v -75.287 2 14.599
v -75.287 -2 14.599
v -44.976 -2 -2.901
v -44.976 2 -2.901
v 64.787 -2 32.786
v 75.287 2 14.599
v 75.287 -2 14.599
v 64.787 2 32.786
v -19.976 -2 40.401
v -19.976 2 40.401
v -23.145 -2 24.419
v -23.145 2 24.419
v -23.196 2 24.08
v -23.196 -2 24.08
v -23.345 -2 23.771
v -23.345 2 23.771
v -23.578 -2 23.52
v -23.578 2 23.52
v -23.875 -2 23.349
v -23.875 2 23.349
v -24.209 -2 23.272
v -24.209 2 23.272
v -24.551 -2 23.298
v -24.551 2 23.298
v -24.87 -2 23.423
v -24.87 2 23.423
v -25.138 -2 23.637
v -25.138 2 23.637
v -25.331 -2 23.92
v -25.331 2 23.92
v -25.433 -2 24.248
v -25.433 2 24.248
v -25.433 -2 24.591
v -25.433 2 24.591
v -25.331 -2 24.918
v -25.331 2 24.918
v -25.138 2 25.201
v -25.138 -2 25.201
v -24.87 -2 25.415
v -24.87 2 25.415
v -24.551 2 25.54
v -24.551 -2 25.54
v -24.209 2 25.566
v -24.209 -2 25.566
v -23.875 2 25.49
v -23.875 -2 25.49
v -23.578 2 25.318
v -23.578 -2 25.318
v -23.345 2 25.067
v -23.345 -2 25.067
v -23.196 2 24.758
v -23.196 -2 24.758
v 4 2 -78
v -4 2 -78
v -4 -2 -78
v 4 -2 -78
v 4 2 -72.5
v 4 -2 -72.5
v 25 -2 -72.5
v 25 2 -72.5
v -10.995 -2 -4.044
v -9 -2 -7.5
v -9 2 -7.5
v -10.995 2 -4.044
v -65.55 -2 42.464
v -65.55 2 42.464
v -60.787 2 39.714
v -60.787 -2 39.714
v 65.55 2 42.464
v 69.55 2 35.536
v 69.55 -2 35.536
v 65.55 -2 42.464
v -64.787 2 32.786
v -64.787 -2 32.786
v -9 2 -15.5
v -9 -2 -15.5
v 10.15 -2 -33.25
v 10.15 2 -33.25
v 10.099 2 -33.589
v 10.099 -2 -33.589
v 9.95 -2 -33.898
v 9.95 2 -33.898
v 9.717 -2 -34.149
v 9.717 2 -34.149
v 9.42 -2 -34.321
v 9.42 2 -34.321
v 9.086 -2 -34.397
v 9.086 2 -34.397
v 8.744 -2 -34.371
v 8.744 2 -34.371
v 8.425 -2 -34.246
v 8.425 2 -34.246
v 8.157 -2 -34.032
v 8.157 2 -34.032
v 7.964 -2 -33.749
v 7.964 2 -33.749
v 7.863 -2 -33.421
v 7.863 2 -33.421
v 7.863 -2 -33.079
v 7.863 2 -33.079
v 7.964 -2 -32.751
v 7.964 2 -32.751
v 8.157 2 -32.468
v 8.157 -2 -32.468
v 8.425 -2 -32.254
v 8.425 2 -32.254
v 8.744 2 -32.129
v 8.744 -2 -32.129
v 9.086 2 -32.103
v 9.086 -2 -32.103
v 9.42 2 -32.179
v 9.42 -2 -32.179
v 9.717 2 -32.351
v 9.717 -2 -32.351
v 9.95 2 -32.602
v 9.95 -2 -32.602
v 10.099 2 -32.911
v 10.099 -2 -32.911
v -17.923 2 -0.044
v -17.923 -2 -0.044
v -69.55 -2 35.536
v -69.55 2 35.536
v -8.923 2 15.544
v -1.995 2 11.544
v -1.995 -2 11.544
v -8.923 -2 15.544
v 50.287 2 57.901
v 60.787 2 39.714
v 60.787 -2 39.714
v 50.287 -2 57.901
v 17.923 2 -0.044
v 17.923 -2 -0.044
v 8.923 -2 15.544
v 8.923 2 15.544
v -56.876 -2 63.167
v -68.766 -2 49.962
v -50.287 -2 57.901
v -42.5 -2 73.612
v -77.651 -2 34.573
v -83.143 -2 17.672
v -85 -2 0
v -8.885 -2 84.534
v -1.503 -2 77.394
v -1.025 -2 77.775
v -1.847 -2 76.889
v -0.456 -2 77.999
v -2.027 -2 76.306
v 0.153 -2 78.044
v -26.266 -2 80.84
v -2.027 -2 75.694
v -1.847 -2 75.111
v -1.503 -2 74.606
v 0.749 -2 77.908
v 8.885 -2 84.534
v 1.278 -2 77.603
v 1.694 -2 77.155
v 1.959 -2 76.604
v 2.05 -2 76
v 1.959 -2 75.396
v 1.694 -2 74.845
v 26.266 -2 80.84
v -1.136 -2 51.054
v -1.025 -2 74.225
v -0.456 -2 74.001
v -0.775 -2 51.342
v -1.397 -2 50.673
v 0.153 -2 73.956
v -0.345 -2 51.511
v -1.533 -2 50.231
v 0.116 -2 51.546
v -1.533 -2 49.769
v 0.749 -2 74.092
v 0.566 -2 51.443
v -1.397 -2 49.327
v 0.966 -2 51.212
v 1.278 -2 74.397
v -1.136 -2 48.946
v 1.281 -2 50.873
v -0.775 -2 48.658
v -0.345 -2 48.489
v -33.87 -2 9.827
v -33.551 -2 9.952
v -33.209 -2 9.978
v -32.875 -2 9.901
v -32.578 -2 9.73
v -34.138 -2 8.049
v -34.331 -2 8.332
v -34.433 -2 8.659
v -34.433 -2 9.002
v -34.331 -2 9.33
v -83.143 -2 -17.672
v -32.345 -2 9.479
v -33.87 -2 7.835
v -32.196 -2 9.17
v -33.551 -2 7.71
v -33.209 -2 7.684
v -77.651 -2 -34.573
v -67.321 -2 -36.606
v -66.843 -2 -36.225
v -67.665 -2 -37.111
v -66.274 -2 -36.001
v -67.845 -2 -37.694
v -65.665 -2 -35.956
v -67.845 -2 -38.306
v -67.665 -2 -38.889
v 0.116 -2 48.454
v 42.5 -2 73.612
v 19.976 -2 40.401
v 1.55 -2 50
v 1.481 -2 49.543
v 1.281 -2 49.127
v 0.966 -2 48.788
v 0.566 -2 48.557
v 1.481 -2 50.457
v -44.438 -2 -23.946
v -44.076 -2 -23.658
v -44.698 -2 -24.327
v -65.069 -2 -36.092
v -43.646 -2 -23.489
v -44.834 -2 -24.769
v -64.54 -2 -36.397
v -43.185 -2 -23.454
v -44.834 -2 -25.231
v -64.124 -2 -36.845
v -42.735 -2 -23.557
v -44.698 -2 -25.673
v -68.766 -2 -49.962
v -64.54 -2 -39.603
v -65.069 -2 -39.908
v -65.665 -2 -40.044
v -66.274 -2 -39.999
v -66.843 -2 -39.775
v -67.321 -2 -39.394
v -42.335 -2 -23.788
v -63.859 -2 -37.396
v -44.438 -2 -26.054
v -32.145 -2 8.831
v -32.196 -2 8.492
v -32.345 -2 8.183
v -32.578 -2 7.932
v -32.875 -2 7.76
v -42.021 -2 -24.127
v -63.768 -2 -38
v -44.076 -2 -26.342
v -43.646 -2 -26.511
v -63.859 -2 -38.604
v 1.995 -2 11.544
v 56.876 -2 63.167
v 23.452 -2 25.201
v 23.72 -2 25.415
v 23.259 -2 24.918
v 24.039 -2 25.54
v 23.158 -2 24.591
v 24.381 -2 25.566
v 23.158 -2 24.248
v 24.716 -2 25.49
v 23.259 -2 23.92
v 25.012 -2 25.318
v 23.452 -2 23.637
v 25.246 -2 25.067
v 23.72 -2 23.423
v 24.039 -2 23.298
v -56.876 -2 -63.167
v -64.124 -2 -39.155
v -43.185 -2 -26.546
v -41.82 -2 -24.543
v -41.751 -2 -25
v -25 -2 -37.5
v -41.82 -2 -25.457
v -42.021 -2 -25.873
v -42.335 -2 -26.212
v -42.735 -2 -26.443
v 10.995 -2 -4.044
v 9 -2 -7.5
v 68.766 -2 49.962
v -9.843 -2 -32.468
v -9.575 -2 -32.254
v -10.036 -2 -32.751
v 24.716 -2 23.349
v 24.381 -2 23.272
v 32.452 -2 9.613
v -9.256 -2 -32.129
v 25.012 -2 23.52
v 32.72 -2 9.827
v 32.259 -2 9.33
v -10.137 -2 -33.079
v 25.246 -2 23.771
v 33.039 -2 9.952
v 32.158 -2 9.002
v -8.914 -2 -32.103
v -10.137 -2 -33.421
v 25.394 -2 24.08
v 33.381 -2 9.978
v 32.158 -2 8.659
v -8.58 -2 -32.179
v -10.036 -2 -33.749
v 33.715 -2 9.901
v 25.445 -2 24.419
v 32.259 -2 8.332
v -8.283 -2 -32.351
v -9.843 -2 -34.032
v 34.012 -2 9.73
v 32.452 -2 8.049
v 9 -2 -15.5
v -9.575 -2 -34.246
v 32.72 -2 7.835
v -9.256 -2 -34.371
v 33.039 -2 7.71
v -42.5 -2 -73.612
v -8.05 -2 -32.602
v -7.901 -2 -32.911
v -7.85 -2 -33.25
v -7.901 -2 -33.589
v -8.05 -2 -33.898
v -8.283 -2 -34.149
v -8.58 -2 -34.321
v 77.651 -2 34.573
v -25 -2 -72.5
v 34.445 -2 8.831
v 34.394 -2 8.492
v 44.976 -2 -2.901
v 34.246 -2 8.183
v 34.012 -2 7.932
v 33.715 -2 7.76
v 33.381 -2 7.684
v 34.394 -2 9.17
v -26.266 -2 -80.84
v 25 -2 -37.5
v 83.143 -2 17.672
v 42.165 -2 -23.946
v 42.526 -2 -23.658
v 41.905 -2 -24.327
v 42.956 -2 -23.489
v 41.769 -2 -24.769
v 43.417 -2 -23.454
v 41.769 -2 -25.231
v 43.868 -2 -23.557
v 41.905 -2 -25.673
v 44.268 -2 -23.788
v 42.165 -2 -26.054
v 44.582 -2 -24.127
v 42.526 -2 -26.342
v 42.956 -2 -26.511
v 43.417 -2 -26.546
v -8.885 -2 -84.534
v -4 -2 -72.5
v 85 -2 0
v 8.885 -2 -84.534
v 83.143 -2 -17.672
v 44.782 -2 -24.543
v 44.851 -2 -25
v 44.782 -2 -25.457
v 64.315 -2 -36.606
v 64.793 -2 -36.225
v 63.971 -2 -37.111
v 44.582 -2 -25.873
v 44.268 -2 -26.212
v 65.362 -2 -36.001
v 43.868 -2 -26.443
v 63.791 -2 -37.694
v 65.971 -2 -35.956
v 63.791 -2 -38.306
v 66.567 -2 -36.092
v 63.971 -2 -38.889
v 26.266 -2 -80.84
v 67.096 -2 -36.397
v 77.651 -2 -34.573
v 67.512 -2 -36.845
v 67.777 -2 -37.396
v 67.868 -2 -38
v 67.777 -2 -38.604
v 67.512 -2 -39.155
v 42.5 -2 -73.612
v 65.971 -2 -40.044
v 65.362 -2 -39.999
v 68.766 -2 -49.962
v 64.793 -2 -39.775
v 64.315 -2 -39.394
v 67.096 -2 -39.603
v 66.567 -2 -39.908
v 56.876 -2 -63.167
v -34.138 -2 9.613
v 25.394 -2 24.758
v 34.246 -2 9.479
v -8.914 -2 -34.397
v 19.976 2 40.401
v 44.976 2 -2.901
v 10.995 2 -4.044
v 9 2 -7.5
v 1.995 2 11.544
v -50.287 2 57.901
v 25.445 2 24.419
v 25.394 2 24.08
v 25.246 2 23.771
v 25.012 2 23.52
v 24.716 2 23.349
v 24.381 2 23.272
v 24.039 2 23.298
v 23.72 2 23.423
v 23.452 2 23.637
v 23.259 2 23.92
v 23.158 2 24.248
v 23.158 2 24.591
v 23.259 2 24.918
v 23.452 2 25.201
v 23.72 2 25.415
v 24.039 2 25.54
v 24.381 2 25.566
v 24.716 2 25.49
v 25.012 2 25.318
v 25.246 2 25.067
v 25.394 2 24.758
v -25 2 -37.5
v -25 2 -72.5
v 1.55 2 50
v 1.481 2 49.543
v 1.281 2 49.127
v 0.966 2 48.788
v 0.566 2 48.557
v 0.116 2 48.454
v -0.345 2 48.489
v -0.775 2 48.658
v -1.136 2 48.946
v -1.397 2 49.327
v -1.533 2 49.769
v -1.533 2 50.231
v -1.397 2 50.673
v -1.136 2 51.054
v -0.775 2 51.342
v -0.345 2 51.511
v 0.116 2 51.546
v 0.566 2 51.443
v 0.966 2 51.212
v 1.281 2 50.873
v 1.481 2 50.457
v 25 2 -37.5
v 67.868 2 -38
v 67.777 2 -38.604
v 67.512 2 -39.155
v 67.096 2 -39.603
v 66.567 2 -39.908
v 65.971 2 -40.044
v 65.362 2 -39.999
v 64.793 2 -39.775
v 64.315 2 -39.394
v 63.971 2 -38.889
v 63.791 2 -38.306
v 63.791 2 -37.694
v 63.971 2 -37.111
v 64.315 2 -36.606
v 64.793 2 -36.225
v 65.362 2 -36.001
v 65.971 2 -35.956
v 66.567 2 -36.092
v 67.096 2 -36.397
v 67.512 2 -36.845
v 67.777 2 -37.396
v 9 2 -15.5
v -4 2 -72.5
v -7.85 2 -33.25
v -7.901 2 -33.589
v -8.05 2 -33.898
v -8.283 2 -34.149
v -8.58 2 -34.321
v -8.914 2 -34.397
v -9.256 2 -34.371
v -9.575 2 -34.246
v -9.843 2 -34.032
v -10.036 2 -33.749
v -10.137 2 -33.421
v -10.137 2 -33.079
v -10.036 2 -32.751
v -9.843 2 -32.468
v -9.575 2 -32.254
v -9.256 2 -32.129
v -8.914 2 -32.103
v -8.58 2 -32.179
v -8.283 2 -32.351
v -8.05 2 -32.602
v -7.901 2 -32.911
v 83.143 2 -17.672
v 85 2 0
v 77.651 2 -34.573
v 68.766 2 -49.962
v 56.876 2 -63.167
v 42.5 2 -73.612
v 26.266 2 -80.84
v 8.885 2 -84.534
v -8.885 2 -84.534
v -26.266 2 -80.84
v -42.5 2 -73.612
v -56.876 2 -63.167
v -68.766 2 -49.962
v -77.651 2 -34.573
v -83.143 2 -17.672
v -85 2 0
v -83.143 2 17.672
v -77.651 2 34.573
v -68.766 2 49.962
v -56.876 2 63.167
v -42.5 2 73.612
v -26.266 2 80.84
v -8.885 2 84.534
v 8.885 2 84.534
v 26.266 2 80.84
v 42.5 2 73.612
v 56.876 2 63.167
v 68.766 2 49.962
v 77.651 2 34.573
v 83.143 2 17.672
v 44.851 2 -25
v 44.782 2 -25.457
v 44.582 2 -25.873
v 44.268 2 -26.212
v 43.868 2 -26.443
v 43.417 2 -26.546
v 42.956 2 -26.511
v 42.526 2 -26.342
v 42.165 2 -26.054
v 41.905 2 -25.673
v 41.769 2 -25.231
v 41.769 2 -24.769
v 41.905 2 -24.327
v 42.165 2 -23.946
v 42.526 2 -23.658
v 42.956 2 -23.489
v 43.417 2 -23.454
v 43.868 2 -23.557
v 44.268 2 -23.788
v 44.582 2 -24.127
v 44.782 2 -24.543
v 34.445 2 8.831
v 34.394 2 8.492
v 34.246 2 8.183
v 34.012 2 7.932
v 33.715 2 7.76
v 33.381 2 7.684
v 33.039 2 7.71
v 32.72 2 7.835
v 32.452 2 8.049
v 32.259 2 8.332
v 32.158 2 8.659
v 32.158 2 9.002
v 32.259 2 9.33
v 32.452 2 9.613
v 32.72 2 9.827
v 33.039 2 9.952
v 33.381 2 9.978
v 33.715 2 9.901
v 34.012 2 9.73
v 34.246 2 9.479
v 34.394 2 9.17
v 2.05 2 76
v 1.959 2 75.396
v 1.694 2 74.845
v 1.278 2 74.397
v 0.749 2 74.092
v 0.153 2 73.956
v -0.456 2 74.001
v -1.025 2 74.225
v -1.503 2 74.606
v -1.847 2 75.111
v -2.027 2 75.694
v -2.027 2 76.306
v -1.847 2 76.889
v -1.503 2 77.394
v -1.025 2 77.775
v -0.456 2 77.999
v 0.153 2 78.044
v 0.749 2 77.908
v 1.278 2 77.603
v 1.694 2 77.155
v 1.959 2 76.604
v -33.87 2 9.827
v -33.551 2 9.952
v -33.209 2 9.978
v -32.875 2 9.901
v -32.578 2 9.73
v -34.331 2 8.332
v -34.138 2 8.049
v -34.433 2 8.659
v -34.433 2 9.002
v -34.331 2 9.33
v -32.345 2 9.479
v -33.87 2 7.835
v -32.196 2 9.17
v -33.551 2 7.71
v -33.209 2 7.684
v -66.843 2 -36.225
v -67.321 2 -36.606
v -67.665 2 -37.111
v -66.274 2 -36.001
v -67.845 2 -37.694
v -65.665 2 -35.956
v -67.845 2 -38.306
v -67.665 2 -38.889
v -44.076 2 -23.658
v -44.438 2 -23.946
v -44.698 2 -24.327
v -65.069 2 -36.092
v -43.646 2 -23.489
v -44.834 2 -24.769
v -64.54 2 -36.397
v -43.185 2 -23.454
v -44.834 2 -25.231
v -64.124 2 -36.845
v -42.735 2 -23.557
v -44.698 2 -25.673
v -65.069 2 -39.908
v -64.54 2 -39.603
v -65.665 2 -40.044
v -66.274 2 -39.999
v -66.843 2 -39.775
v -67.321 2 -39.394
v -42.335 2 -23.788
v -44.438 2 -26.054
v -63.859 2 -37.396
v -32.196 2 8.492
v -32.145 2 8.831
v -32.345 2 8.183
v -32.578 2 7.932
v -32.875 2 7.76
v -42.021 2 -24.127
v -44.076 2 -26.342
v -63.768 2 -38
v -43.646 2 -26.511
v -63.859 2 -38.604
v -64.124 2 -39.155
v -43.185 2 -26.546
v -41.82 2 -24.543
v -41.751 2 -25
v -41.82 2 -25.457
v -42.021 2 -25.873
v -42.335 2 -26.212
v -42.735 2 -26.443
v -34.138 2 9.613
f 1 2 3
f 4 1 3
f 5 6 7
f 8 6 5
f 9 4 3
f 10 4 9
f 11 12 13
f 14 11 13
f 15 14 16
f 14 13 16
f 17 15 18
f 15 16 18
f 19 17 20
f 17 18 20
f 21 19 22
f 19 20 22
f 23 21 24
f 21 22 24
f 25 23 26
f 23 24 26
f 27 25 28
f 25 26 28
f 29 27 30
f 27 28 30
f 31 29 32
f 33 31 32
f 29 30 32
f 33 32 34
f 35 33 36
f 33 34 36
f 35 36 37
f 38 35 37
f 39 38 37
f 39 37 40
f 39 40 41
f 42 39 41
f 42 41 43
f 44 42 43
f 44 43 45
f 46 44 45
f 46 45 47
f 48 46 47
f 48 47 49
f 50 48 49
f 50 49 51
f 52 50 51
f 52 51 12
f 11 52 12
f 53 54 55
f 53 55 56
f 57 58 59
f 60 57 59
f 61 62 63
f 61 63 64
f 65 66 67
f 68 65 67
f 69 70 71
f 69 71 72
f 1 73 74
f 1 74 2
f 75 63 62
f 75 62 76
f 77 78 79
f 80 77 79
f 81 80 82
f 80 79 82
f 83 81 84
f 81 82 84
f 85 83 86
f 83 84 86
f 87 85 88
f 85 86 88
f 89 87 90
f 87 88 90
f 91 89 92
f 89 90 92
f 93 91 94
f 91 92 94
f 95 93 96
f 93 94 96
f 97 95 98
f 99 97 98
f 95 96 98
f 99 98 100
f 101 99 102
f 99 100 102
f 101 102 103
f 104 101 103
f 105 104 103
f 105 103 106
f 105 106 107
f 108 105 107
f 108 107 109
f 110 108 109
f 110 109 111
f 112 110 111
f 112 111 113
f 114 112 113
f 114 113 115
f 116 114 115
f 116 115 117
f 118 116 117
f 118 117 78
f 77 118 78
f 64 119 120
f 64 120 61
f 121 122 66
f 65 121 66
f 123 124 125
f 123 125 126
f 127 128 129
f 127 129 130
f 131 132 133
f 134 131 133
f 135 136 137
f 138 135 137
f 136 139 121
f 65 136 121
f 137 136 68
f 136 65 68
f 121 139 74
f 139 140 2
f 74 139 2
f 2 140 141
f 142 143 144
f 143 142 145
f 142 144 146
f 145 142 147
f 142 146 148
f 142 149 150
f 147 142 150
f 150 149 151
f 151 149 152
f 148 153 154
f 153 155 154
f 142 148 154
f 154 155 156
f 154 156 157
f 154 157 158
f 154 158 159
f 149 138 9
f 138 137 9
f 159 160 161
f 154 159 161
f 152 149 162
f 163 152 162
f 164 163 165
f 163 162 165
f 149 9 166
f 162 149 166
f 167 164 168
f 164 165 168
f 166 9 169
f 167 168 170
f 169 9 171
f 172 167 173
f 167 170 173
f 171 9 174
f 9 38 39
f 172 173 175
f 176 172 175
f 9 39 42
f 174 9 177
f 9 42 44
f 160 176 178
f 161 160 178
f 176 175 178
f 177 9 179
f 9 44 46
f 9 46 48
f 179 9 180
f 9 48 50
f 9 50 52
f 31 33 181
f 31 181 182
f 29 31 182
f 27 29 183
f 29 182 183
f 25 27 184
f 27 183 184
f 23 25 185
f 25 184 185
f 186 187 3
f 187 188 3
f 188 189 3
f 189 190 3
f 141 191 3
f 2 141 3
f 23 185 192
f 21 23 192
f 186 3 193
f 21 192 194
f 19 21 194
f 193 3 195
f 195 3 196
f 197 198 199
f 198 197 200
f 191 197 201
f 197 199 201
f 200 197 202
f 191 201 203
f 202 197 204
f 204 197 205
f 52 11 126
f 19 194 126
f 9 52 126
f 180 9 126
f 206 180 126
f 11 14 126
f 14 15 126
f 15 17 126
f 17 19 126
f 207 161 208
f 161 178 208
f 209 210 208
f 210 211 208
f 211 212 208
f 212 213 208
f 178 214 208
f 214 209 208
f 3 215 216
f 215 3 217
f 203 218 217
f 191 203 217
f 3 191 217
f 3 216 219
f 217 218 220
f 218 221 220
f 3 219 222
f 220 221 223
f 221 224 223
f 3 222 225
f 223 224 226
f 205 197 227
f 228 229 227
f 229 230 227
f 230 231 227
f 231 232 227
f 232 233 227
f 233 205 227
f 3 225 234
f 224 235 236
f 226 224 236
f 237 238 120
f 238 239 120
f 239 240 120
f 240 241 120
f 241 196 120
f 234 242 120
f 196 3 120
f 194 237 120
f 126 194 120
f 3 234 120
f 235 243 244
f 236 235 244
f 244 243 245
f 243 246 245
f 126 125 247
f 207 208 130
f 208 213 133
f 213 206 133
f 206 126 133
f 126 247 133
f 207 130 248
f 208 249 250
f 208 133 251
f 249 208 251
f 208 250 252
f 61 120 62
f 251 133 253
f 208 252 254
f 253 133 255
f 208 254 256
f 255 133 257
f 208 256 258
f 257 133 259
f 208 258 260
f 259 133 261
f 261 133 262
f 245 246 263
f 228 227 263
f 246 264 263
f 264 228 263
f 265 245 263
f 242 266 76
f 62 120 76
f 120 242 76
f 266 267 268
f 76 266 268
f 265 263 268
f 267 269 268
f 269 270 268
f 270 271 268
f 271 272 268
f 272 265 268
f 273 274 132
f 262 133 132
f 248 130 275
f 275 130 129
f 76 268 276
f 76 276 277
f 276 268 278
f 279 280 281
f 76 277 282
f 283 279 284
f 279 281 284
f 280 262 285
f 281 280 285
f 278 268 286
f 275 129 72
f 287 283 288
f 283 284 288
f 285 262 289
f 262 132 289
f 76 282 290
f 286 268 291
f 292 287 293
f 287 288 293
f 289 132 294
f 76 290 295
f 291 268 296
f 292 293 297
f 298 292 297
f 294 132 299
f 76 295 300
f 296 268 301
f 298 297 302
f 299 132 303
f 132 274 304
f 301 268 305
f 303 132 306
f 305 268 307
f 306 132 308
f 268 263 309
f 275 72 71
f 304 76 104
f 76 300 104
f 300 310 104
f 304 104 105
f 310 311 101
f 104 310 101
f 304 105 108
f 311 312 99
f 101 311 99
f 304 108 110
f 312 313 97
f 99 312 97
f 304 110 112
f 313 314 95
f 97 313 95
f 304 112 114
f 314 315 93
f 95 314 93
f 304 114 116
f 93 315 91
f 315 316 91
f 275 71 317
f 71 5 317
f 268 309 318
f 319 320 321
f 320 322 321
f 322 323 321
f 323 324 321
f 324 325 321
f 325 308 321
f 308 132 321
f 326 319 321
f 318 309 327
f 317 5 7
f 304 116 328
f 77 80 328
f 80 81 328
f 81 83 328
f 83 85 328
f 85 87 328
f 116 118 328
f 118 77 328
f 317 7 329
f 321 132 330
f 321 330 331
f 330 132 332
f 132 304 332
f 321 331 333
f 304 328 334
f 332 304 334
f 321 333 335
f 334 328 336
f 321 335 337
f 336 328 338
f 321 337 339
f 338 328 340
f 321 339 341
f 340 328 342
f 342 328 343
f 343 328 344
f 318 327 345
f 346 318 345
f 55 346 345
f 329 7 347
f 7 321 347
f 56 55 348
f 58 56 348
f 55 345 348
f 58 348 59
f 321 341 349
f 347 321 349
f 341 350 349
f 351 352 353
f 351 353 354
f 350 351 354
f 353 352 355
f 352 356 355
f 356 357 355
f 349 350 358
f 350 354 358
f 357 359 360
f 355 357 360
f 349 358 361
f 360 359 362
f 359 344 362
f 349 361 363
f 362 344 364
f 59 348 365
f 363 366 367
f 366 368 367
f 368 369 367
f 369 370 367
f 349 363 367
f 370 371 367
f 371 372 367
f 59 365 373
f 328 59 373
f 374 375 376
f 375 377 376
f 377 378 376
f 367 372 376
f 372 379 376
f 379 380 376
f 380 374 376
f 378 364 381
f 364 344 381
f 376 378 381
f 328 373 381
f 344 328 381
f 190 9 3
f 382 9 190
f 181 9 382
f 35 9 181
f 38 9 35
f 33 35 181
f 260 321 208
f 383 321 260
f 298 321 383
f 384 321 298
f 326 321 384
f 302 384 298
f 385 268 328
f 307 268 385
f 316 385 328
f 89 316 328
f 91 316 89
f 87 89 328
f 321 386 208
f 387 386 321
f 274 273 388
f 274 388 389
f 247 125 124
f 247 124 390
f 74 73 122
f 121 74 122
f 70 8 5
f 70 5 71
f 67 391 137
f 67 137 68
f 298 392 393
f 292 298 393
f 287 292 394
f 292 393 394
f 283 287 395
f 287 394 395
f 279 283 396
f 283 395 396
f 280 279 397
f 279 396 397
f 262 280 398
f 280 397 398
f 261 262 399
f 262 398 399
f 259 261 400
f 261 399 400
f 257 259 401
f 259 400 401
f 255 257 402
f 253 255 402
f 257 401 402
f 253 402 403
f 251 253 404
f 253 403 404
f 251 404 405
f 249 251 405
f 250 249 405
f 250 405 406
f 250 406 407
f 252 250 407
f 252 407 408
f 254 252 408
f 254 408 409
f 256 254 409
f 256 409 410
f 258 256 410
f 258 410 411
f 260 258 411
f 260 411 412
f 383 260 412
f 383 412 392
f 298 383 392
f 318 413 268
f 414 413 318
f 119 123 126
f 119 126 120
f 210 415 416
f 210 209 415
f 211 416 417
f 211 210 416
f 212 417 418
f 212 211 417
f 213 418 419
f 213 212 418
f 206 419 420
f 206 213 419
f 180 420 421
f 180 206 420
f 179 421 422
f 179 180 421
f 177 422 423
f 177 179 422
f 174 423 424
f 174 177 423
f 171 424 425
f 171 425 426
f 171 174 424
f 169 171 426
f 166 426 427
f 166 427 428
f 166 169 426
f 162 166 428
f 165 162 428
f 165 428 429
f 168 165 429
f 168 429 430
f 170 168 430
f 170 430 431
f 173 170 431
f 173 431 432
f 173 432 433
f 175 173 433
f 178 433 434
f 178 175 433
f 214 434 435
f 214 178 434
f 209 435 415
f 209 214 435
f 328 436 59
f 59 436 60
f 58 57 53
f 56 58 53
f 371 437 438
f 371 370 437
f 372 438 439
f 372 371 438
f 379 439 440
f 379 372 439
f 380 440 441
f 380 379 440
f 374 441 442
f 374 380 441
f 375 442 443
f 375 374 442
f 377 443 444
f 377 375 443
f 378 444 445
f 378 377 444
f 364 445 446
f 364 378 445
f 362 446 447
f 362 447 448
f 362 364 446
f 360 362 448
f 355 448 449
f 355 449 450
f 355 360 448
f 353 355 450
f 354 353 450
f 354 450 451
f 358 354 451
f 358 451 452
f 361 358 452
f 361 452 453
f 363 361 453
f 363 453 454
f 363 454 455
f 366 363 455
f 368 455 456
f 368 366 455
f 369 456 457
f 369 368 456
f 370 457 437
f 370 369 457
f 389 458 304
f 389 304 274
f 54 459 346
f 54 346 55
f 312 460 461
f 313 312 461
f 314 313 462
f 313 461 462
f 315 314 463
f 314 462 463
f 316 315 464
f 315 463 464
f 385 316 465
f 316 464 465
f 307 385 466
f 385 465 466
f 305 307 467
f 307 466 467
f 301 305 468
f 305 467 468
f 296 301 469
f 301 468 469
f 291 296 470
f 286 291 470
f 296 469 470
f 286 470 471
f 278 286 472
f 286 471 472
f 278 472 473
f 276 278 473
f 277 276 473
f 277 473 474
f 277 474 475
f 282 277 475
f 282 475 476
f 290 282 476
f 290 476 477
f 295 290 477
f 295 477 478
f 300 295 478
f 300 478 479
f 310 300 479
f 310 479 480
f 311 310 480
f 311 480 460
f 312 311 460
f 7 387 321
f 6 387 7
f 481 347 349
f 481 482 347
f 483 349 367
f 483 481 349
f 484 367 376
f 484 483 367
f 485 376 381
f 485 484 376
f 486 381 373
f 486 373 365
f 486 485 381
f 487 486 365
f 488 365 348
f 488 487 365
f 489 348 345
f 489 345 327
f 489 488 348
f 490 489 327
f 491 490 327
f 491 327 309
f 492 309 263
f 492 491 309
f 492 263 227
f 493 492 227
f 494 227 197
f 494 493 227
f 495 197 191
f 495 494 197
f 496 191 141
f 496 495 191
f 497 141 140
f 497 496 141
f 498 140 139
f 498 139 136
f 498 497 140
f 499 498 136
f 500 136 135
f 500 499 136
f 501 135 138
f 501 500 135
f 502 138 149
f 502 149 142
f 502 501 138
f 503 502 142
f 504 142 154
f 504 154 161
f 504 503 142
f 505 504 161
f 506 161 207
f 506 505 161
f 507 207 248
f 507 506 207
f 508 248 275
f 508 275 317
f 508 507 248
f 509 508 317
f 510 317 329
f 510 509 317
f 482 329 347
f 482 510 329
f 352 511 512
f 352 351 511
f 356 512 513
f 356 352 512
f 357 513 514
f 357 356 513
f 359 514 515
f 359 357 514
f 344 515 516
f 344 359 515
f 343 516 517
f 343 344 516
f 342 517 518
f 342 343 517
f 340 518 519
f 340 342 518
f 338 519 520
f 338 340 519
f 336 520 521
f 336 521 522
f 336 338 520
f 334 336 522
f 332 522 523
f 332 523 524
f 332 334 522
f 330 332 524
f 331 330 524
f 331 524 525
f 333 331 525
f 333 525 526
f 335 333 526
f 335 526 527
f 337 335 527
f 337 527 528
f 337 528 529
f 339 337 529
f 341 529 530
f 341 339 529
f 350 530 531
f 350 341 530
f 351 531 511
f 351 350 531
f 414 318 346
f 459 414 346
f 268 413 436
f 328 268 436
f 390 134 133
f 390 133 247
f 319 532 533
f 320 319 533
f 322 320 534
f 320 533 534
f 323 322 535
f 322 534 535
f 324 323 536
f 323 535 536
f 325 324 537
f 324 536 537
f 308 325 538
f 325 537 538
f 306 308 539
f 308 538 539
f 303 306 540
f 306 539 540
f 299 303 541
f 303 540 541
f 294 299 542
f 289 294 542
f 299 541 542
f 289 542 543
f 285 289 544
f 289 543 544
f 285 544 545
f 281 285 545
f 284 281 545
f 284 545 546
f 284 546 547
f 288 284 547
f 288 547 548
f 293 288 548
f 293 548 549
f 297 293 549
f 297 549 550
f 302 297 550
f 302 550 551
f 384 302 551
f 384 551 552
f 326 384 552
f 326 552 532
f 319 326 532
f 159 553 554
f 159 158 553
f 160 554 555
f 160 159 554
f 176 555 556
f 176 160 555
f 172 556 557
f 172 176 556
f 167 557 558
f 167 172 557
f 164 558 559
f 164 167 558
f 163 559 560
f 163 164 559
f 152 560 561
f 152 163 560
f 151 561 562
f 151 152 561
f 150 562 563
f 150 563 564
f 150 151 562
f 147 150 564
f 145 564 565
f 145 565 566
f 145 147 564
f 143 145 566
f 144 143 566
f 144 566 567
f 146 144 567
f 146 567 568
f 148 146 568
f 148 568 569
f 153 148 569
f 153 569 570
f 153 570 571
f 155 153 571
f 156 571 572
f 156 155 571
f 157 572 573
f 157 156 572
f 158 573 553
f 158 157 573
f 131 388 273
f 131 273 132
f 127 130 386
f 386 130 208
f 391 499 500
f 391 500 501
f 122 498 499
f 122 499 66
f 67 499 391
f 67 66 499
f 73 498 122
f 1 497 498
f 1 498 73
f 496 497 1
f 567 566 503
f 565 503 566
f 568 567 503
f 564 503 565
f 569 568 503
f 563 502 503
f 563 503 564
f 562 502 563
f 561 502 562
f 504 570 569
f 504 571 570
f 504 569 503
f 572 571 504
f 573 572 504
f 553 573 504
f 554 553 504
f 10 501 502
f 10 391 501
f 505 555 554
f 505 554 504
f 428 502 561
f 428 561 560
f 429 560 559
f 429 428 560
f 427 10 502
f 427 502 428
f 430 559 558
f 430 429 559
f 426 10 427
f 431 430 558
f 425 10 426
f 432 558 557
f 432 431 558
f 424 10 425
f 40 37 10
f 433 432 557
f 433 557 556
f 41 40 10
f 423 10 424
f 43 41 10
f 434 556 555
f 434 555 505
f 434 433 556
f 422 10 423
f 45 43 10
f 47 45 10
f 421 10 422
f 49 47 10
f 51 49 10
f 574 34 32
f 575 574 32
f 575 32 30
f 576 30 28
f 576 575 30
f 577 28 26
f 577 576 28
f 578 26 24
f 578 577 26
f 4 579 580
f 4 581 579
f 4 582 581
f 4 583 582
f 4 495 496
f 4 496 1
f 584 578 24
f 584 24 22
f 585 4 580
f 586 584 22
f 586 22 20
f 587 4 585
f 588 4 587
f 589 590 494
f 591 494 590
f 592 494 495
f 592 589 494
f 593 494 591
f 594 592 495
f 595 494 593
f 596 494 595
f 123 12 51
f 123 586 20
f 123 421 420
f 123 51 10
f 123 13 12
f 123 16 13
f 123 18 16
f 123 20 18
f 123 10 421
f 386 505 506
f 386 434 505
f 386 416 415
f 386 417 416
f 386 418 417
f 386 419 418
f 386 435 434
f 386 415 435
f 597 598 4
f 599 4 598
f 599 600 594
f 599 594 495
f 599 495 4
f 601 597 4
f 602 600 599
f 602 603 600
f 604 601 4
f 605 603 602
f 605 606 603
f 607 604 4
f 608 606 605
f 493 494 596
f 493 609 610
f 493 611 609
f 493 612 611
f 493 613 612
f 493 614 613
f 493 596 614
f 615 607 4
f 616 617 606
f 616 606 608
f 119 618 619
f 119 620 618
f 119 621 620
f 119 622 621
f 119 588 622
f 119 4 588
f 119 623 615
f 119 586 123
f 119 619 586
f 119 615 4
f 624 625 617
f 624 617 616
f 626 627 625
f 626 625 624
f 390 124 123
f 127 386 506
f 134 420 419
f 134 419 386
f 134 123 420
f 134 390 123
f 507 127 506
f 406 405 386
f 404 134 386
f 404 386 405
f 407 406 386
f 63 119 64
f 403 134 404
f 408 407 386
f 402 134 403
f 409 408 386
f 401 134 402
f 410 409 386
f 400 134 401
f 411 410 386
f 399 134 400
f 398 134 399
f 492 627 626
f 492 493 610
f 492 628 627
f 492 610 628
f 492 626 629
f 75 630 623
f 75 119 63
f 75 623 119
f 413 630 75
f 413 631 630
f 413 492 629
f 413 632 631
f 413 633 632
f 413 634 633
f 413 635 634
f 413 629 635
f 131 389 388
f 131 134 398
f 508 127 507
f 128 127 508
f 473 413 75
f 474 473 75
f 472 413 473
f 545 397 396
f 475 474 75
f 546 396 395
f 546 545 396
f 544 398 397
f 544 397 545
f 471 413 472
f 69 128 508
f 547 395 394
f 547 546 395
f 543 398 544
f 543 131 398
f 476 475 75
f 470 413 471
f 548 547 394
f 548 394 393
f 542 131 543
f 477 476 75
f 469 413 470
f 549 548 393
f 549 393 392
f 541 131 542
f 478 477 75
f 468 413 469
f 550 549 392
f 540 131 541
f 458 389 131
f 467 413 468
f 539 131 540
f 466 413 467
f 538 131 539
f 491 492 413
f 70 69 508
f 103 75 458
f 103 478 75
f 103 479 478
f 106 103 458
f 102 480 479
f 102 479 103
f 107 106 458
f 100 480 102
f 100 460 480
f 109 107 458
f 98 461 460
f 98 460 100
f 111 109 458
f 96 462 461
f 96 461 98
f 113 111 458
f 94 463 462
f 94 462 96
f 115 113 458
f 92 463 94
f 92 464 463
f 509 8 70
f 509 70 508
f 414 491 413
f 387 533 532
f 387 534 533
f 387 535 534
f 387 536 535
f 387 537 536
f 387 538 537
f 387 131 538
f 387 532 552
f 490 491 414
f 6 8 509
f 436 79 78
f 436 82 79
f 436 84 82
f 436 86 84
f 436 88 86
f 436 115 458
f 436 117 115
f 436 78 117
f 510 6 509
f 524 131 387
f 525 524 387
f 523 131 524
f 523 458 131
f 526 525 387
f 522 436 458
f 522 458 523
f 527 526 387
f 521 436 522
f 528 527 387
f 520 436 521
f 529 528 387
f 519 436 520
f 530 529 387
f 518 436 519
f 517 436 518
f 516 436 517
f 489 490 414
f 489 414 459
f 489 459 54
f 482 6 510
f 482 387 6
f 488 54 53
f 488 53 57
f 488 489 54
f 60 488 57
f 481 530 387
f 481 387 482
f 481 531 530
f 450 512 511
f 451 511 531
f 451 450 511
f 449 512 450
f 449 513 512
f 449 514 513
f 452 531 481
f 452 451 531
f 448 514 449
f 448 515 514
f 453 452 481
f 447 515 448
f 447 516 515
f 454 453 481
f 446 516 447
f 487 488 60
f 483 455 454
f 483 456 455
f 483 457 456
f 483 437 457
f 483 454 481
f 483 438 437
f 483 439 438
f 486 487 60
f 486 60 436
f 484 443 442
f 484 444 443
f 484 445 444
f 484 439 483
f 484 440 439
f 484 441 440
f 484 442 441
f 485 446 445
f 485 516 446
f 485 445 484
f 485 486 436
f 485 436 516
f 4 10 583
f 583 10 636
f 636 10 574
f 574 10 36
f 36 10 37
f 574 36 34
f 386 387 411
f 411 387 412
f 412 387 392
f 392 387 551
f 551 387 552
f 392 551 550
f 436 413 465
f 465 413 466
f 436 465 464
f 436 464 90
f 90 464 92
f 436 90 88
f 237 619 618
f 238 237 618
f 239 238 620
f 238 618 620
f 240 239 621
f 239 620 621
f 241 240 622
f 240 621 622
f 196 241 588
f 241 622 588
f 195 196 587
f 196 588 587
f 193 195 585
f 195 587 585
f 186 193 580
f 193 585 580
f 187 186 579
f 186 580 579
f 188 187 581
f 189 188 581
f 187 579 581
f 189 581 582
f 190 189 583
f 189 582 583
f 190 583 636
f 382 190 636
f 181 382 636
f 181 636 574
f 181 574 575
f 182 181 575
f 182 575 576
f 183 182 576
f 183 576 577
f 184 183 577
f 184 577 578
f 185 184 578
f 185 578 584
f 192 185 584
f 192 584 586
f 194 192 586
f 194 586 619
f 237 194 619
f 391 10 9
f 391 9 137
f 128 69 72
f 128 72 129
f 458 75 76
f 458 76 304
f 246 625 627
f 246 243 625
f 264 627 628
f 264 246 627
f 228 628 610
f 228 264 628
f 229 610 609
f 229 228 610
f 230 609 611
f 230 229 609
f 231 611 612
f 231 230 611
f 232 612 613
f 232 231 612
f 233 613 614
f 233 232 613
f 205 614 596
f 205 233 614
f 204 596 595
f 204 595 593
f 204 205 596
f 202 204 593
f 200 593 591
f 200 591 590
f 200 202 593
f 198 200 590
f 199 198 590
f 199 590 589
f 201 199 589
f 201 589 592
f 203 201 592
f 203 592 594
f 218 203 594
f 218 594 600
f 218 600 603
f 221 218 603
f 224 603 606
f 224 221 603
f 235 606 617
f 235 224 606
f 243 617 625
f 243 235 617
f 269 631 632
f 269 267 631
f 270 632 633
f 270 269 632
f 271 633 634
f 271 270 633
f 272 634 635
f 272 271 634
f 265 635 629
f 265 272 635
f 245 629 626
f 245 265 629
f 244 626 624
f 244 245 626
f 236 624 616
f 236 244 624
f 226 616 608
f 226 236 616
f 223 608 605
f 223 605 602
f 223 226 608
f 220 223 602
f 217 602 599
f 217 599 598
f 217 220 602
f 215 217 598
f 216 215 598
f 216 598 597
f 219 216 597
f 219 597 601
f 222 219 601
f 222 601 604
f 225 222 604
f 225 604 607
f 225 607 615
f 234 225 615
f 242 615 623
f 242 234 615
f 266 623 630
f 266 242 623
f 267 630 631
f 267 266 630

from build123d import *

# Parameters (mm, degrees)
SKETCH1_R           = 85
SKETCH1_R_2         = 2.05
SKETCH1_R_3         = 1.55
SKETCH1_W           = 50
SKETCH1_H           = 35
BOSS_EXTRUDE1_DEPTH = 2
SKETCH2_R           = 1.15
SKETCH2_R_2         = 1.150012437
CUT_EXTRUDE1_DEPTH  = 5
CUT_EXTRUDE2_START  = -4
CUT_EXTRUDE2_DEPTH  = 4
CUT_EXTRUDE3_REACH  = 6
SKETCH4_W           = 8
SKETCH4_H           = 5.5


with BuildPart() as part:
    # Sketch1 → Boss-Extrude1 (new body, symmetric)
    with BuildSketch(Plane(origin=(0, 0, 0), x_dir=(1, 0, 0), z_dir=(0, 1, 0))):
        Circle(SKETCH1_R)
        with Locations((65.817930688, 38)):
            Circle(SKETCH1_R_2, mode=Mode.SUBTRACT)
        with Locations((0, -76)):
            Circle(SKETCH1_R_2, mode=Mode.SUBTRACT)
        with Locations((-65.817930688, 38)):
            Circle(SKETCH1_R_2, mode=Mode.SUBTRACT)
        with Locations((43.301270189, 25)):
            Circle(SKETCH1_R_3, mode=Mode.SUBTRACT)
        with Locations((0, -50)):
            Circle(SKETCH1_R_3, mode=Mode.SUBTRACT)
        with Locations((-43.301270189, 25)):
            Circle(SKETCH1_R_3, mode=Mode.SUBTRACT)
        Polygon((75.286841774, -14.599364905), (50.286841774, -57.900635095), (19.975952642, -40.400635095), (44.975952642, 2.900635095), align=None, mode=Mode.SUBTRACT)
        with Locations((0, 55)):
            Rectangle(SKETCH1_W, SKETCH1_H, mode=Mode.SUBTRACT)
        Polygon((-50.286841774, -57.900635095), (-75.286841774, -14.599364905), (-44.975952642, 2.900635095), (-19.975952642, -40.400635095), align=None, mode=Mode.SUBTRACT)
        with BuildLine():
            Line((17.923393759, 0.044228634), (8.923393759, -15.544228634))
            Line((8.923393759, -15.544228634), (0.263139721, -10.544228634))
            Line((0.263139721, -10.544228634), (1.201188009, -8.91948134))
            ThreePointArc((1.201188009, -8.91948134), (0, -9), (-1.201188009, -8.91948134))
            Line((-1.201188009, -8.91948134), (-0.263139721, -10.544228634))
            Line((-0.263139721, -10.544228634), (-8.923393759, -15.544228634))
            Line((-8.923393759, -15.544228634), (-17.923393759, 0.044228634))
            Line((-17.923393759, 0.044228634), (-9.263139721, 5.044228634))
            Line((-9.263139721, 5.044228634), (-8.325091433, 3.41948134))
            ThreePointArc((-8.325091433, 3.41948134), (-7.794228634, 4.5), (-7.123903424, 5.5))
            Line((-7.123903424, 5.5), (-9, 5.5))
            Line((-9, 5.5), (-9, 15.5))
            Line((-9, 15.5), (9, 15.5))
            Line((9, 15.5), (9, 5.5))
            Line((9, 5.5), (7.123903424, 5.5))
            ThreePointArc((7.123903424, 5.5), (7.794228634, 4.5), (8.325091433, 3.41948134))
            Line((8.325091433, 3.41948134), (9.263139721, 5.044228634))
            Line((9.263139721, 5.044228634), (17.923393759, 0.044228634))
        make_face(mode=Mode.SUBTRACT)
    extrude(amount=BOSS_EXTRUDE1_DEPTH, both=True)

    # Sketch2 → Cut-Extrude1 (cut, through all)
    with BuildSketch(Plane(origin=(0, 2, 0), x_dir=(1, 0, 0), z_dir=(0, 1, 0))):
        with Locations((-9, 33.25)):
            Circle(SKETCH2_R)
        with Locations((9, 33.25)):
            Circle(SKETCH2_R)
        with Locations((-33.295344676, -8.830771366)):
            Circle(SKETCH2_R)
        with Locations((-24.295344676, -24.419228634)):
            Circle(SKETCH2_R)
        with Locations((24.295355446, -24.419234852)):
            Circle(SKETCH2_R_2)
        with Locations((33.295344676, -8.830771366)):
            Circle(SKETCH2_R)
    extrude(amount=-CUT_EXTRUDE1_DEPTH, mode=Mode.SUBTRACT)

    # Sketch3 → Cut-Extrude2 (cut)
    with BuildSketch(Plane(origin=(0, 2, 0), x_dir=(1, 0, 0), z_dir=(0, 1, 0)).offset(CUT_EXTRUDE2_START)):
        Polygon((9, 7.5), (-9, 7.5), (-10.995190528, 4.044228634), (-1.995190528, -11.544228634), (1.995190528, -11.544228634), (10.995190528, 4.044228634), align=None)
    extrude(amount=CUT_EXTRUDE2_DEPTH, mode=Mode.SUBTRACT)

    # Sketch4 → Cut-Extrude3 (cut, up to next)
    with BuildSketch(Plane(origin=(0, 2, 0), x_dir=(1, 0, 0), z_dir=(0, 1, 0)), mode=Mode.PRIVATE) as cut_extrude3_sk1:
        Polygon((64.786841774, -32.785898385), (69.549981495, -35.535898385), (65.549981495, -42.464101615), (60.786841774, -39.714101615), align=None)
    cut_extrude3_tool1 = extrude(cut_extrude3_sk1.sketch, amount=-CUT_EXTRUDE3_REACH, mode=Mode.PRIVATE) & part.part
    add(cut_extrude3_tool1.solids().sort_by_distance((65.168412, 2, 37.625))[0], mode=Mode.SUBTRACT)
    # Sketch4 → Cut-Extrude3 (cut, up to next)
    with BuildSketch(Plane(origin=(0, 2, 0), x_dir=(1, 0, 0), z_dir=(0, 1, 0)), mode=Mode.PRIVATE) as cut_extrude3_sk2:
        Polygon((-60.786841774, -39.714101615), (-64.786841774, -32.785898385), (-69.549981495, -35.535898385), (-65.549981495, -42.464101615), align=None)
    cut_extrude3_tool2 = extrude(cut_extrude3_sk2.sketch, amount=-CUT_EXTRUDE3_REACH, mode=Mode.PRIVATE) & part.part
    add(cut_extrude3_tool2.solids().sort_by_distance((-65.168412, 2, 37.625))[0], mode=Mode.SUBTRACT)
    # Sketch4 → Cut-Extrude3 (cut, up to next)
    with BuildSketch(Plane(origin=(0, 2, 0), x_dir=(1, 0, 0), z_dir=(0, 1, 0)), mode=Mode.PRIVATE) as cut_extrude3_sk3:
        with Locations((0, 75.25)):
            Rectangle(SKETCH4_W, SKETCH4_H)
    cut_extrude3_tool3 = extrude(cut_extrude3_sk3.sketch, amount=-CUT_EXTRUDE3_REACH, mode=Mode.PRIVATE) & part.part
    add(cut_extrude3_tool3.solids().sort_by_distance((0, 2, -75.25))[0], mode=Mode.SUBTRACT)


solid = part.part
